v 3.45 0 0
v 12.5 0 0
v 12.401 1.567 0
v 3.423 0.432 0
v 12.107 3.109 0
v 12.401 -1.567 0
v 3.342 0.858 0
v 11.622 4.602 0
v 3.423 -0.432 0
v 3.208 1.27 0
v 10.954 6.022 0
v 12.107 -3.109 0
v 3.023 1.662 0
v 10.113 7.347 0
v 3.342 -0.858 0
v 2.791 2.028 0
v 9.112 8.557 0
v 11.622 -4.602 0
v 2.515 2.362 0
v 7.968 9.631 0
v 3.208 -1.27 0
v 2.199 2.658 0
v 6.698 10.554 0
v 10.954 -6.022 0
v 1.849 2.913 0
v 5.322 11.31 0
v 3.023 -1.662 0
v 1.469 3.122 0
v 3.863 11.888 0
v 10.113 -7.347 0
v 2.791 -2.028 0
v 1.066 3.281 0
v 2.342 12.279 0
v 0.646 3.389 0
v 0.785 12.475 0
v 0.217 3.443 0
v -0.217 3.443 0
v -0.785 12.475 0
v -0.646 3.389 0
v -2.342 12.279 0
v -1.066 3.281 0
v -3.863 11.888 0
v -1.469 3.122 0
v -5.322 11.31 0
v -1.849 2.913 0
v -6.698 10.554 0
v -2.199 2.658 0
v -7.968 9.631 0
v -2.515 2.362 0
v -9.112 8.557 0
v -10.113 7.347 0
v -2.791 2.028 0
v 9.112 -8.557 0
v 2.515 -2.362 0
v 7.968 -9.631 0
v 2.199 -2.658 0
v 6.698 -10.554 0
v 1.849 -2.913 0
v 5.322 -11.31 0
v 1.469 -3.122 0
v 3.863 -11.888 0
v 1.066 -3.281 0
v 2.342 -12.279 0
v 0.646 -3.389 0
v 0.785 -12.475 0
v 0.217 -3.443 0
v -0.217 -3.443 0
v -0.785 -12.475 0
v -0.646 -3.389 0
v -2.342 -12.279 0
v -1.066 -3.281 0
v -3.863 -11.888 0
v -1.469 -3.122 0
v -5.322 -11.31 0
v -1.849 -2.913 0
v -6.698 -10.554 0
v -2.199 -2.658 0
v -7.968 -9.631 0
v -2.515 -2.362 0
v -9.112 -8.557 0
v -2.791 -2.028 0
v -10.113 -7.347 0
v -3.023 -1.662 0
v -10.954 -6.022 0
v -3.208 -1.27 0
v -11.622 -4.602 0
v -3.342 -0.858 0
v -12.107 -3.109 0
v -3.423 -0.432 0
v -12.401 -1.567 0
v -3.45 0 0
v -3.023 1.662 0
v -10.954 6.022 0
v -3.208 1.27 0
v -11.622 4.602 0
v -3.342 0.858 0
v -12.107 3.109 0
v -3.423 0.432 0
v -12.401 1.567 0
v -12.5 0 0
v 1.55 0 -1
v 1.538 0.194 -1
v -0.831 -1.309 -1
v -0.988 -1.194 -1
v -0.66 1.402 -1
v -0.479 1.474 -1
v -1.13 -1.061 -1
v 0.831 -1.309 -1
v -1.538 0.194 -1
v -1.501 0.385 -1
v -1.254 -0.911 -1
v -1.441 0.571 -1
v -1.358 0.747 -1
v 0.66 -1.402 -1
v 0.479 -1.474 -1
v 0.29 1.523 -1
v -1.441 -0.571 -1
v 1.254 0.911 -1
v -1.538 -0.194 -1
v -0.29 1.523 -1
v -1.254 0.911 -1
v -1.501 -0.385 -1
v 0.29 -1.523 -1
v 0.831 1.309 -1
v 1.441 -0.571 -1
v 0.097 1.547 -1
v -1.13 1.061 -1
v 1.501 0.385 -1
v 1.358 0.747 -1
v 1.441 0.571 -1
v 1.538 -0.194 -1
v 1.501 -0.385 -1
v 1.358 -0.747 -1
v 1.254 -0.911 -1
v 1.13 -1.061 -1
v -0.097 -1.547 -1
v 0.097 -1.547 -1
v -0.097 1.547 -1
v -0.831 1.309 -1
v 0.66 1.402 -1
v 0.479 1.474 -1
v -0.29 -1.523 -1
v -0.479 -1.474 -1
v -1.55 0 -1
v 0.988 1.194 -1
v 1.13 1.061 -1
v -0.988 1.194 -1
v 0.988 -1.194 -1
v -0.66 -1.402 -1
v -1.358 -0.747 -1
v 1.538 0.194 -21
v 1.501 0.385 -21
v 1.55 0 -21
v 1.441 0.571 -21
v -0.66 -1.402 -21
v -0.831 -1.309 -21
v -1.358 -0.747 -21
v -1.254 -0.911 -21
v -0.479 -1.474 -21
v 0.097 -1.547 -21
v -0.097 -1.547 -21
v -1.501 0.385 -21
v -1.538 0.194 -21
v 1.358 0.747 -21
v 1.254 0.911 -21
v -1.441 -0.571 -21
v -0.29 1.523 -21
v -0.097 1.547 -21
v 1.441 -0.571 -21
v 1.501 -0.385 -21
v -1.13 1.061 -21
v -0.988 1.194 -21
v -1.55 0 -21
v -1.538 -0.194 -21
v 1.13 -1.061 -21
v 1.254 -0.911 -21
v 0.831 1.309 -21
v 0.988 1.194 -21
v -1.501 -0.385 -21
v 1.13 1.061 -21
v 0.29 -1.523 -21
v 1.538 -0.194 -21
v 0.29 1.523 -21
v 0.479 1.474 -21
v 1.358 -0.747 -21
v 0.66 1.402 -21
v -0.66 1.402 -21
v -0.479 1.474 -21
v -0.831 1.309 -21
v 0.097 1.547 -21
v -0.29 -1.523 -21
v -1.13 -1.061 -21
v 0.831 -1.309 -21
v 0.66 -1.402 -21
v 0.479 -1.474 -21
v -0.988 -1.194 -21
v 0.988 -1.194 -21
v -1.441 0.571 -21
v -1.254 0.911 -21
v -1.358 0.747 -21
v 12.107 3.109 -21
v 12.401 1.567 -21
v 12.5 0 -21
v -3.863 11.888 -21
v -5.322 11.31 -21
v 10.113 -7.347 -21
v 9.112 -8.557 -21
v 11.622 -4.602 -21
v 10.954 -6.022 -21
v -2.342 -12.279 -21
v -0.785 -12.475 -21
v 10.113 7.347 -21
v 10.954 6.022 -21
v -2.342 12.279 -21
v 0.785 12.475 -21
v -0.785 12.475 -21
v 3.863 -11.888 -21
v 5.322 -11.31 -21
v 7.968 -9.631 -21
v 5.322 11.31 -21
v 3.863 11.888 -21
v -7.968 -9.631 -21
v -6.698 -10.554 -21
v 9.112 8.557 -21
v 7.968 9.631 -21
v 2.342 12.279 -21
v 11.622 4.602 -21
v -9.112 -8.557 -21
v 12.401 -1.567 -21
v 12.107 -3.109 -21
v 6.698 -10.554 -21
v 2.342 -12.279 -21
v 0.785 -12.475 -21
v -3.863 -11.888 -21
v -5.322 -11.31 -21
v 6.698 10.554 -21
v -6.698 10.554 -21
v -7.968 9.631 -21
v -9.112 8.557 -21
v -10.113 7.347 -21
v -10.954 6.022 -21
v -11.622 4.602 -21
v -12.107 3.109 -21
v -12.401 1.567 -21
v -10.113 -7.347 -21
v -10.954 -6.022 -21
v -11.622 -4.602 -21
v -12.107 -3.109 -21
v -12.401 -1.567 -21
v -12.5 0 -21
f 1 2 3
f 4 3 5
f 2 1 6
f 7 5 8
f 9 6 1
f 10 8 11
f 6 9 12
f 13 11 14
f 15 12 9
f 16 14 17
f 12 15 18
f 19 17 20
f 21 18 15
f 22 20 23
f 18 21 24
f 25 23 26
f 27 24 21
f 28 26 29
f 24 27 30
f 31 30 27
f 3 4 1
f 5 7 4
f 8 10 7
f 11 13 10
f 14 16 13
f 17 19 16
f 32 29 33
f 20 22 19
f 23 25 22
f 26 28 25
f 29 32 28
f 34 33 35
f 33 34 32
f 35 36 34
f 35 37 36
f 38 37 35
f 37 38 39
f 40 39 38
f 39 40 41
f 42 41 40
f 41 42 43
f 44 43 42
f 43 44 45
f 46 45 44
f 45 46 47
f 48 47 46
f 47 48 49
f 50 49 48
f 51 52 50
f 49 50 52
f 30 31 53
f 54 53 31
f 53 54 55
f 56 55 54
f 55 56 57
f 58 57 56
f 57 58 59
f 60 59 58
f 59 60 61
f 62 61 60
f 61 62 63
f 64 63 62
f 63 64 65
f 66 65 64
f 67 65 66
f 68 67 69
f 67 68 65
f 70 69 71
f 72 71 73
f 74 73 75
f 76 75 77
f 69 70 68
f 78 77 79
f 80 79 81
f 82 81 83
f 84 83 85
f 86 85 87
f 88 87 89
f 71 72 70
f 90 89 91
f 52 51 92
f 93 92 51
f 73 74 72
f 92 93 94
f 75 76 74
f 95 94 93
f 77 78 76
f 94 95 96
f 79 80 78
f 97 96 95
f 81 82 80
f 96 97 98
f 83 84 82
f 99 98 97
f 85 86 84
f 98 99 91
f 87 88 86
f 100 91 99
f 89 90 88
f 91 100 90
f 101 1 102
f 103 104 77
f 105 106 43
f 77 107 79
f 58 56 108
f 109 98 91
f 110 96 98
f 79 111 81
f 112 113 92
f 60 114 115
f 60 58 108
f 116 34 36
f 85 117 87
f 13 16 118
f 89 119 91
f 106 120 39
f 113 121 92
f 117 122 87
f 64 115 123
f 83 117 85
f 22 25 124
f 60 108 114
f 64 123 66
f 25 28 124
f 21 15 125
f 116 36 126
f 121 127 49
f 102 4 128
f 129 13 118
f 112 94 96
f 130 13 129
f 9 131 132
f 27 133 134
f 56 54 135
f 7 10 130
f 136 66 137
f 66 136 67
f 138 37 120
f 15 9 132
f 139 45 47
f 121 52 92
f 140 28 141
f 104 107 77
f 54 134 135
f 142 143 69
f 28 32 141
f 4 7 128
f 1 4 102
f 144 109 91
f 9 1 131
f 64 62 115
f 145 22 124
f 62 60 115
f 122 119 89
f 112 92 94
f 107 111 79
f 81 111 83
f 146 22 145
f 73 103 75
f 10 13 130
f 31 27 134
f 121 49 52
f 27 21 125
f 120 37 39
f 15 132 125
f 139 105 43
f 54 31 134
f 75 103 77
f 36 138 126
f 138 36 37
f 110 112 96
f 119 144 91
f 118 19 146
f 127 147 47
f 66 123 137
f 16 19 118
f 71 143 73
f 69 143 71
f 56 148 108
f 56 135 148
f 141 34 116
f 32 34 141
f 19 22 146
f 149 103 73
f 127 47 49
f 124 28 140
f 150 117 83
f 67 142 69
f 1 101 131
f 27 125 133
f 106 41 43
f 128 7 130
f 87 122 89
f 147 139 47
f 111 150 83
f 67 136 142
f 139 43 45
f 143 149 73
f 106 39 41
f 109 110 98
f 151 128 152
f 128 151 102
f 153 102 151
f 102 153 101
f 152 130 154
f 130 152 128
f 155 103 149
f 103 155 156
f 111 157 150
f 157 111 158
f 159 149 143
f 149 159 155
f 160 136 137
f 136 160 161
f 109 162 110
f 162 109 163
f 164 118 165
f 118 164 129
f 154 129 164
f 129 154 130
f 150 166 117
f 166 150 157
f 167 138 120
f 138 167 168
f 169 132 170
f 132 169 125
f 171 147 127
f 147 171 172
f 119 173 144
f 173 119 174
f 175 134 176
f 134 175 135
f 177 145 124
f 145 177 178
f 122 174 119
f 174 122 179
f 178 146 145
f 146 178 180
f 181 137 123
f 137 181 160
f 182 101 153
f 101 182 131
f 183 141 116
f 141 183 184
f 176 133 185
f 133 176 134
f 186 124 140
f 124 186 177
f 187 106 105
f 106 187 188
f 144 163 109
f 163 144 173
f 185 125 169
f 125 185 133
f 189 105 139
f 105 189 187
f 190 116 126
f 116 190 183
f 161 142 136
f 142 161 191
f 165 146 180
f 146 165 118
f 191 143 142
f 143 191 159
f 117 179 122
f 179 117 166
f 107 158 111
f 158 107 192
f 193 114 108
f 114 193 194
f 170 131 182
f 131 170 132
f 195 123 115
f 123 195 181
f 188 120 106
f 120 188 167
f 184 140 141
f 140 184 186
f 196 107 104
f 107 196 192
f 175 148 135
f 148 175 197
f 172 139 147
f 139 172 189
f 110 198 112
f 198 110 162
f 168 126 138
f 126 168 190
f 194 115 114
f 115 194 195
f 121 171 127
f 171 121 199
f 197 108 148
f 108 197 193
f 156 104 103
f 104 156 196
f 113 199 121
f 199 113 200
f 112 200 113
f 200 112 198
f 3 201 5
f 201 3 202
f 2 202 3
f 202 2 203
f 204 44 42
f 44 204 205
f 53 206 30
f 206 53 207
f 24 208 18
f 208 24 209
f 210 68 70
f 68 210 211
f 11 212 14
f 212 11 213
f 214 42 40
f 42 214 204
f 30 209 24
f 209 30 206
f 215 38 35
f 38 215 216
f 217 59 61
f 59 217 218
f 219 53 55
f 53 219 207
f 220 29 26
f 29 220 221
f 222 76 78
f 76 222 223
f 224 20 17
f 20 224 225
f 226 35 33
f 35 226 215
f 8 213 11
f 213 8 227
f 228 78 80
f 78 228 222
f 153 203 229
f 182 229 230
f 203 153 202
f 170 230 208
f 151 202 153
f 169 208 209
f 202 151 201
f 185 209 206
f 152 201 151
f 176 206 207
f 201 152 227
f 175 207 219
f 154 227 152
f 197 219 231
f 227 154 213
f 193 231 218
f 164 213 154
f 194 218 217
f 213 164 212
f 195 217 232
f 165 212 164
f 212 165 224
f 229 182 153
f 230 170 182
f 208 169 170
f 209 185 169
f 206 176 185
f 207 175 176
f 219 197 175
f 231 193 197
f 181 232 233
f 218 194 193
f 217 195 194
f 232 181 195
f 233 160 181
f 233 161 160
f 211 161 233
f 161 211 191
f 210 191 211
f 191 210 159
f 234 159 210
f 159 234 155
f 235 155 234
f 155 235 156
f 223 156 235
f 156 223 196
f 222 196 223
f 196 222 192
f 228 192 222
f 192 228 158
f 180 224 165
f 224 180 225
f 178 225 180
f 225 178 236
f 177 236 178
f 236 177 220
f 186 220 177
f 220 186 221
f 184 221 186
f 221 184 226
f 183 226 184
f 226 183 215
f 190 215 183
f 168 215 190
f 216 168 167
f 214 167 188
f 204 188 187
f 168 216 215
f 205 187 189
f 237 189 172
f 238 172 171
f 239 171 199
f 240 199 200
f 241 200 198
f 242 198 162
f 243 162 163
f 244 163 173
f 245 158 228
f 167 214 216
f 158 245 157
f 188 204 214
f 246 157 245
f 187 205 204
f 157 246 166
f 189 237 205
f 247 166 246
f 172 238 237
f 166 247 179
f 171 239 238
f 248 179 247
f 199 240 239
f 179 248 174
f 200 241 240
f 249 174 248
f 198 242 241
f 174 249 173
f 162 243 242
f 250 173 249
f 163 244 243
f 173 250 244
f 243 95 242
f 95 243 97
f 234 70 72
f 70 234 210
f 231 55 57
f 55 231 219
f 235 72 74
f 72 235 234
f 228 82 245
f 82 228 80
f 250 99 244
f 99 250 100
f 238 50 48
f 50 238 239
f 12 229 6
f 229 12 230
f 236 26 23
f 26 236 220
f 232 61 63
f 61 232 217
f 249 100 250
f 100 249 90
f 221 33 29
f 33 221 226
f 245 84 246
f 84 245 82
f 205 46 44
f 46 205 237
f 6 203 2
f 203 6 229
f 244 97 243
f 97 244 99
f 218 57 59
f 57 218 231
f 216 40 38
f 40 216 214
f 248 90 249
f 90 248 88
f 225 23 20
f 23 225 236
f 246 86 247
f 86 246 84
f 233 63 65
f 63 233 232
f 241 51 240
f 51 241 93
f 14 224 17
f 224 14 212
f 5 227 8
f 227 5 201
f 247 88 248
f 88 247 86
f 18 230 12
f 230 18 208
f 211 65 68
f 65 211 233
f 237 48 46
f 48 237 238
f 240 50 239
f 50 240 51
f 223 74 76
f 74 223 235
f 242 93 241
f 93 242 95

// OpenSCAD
$fn = 50;

difference() {
	union() {
		translate(v = [0, 0, -21.0]) {
			cylinder(h = 21, r = 12.5);
		}
	}
	union() {
		translate(v = [0, 0, 0]) {
			rotate(a = [0, 0, 0]) {
				difference() {
					union() {
						translate(v = [0, 0, -24.0]) {
							cylinder(h = 24, r = 1.25);
						}
						translate(v = [0, 0, -1.0]) {
							cylinder(h = 1.0, r1 = 1.55, r2 = 3.45);
						}
						translate(v = [0, 0, -24.0]) {
							cylinder(h = 24, r = 1.55);
						}
						translate(v = [0, 0, -24.0]) {
							cylinder(h = 24, r = 1.25);
						}
					}
					union();
				}
			}
		}
	}
}
